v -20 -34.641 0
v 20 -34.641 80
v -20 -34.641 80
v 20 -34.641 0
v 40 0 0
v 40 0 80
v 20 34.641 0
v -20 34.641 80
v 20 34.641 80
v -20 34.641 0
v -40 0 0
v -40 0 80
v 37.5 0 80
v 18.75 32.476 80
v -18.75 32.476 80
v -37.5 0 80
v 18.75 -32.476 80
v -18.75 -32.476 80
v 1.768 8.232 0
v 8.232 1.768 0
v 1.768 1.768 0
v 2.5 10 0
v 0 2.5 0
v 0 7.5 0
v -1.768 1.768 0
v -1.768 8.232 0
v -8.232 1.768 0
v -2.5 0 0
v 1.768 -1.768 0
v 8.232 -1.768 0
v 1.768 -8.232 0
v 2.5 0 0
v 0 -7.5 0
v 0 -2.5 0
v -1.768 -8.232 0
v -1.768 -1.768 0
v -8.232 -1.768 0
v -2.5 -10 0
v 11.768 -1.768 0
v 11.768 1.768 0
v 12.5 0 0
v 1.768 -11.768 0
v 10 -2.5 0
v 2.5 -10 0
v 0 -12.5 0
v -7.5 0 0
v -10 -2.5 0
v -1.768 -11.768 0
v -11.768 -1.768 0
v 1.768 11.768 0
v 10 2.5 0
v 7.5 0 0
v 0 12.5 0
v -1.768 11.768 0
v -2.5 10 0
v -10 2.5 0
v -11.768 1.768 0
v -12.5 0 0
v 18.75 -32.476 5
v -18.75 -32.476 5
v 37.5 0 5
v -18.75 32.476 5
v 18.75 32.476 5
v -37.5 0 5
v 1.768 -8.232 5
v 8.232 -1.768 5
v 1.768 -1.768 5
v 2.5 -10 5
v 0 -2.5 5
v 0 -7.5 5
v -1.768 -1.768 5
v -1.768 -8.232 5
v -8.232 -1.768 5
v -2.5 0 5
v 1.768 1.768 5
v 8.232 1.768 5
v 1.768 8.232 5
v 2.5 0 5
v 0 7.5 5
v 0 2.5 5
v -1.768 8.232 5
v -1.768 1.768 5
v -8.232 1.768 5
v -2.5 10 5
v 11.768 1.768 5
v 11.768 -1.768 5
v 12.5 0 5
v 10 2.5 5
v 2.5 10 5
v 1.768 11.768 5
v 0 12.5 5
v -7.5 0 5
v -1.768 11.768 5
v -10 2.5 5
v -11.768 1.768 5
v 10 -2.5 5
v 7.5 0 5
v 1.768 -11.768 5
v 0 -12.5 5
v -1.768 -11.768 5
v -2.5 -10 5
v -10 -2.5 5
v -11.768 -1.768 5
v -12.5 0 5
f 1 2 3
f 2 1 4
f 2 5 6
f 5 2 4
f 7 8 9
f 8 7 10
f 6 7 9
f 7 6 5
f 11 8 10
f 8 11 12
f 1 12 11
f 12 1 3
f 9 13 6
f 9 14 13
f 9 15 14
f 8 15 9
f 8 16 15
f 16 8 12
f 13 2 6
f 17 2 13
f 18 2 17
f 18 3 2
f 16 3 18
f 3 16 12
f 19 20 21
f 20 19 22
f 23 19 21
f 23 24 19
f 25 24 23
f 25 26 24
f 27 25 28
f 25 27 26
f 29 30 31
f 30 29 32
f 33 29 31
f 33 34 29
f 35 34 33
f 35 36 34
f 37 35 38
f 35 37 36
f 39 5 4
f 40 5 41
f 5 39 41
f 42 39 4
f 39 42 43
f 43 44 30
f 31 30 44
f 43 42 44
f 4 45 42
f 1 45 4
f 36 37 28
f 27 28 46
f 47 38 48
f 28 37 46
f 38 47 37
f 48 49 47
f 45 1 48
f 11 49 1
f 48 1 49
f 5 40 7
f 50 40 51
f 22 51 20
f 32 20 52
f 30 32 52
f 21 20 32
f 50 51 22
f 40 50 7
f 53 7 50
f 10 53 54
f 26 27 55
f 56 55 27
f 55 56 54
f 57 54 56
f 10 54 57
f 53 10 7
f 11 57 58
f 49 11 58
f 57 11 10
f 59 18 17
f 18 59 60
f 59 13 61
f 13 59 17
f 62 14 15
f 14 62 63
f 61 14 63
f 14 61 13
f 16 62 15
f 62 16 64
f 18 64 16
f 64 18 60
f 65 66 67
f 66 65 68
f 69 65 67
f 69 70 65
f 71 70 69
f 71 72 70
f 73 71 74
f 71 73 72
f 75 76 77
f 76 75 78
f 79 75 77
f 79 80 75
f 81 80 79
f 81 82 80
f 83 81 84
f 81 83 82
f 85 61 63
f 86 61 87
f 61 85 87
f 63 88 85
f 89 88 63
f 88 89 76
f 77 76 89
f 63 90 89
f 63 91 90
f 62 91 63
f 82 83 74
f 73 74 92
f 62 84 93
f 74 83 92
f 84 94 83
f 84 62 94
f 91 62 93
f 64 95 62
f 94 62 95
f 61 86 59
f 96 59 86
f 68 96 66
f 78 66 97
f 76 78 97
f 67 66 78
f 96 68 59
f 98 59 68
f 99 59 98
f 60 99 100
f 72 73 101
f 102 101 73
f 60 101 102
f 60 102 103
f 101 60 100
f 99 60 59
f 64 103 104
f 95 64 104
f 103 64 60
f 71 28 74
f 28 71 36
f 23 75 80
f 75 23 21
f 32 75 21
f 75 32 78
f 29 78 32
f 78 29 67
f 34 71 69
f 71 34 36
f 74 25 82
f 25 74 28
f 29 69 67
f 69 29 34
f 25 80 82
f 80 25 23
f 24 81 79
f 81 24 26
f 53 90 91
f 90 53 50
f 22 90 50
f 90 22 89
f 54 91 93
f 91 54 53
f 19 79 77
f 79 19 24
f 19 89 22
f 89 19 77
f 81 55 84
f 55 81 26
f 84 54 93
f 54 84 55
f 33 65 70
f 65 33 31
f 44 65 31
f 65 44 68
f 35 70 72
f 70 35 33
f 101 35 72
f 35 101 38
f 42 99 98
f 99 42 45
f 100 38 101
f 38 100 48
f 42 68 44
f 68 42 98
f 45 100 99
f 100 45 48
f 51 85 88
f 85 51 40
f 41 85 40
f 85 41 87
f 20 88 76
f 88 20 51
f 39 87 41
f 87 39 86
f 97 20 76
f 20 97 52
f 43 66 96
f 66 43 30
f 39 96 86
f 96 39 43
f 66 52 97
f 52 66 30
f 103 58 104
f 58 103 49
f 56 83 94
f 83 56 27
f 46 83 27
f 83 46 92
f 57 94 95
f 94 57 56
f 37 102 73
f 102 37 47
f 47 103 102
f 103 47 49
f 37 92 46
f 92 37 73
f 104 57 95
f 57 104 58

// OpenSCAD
difference() {
cylinder(d=80,h=80,$fn
=6);
translate([0,0,5]) {cylinder(d=75,h=82,$fn=6);}
translate([0,0,-5]) {cylinder(d=5,h=12);}
translate([0,10,-5]) {cylinder(d=5,h=12);}
translate([0,-10,-5]) {cylinder(d=5,h=12);}
translate([10,0,-5]) {cylinder(d=5,h=12);}
translate([-10,0,-5]) {cylinder(d=5,h=12);}
}
